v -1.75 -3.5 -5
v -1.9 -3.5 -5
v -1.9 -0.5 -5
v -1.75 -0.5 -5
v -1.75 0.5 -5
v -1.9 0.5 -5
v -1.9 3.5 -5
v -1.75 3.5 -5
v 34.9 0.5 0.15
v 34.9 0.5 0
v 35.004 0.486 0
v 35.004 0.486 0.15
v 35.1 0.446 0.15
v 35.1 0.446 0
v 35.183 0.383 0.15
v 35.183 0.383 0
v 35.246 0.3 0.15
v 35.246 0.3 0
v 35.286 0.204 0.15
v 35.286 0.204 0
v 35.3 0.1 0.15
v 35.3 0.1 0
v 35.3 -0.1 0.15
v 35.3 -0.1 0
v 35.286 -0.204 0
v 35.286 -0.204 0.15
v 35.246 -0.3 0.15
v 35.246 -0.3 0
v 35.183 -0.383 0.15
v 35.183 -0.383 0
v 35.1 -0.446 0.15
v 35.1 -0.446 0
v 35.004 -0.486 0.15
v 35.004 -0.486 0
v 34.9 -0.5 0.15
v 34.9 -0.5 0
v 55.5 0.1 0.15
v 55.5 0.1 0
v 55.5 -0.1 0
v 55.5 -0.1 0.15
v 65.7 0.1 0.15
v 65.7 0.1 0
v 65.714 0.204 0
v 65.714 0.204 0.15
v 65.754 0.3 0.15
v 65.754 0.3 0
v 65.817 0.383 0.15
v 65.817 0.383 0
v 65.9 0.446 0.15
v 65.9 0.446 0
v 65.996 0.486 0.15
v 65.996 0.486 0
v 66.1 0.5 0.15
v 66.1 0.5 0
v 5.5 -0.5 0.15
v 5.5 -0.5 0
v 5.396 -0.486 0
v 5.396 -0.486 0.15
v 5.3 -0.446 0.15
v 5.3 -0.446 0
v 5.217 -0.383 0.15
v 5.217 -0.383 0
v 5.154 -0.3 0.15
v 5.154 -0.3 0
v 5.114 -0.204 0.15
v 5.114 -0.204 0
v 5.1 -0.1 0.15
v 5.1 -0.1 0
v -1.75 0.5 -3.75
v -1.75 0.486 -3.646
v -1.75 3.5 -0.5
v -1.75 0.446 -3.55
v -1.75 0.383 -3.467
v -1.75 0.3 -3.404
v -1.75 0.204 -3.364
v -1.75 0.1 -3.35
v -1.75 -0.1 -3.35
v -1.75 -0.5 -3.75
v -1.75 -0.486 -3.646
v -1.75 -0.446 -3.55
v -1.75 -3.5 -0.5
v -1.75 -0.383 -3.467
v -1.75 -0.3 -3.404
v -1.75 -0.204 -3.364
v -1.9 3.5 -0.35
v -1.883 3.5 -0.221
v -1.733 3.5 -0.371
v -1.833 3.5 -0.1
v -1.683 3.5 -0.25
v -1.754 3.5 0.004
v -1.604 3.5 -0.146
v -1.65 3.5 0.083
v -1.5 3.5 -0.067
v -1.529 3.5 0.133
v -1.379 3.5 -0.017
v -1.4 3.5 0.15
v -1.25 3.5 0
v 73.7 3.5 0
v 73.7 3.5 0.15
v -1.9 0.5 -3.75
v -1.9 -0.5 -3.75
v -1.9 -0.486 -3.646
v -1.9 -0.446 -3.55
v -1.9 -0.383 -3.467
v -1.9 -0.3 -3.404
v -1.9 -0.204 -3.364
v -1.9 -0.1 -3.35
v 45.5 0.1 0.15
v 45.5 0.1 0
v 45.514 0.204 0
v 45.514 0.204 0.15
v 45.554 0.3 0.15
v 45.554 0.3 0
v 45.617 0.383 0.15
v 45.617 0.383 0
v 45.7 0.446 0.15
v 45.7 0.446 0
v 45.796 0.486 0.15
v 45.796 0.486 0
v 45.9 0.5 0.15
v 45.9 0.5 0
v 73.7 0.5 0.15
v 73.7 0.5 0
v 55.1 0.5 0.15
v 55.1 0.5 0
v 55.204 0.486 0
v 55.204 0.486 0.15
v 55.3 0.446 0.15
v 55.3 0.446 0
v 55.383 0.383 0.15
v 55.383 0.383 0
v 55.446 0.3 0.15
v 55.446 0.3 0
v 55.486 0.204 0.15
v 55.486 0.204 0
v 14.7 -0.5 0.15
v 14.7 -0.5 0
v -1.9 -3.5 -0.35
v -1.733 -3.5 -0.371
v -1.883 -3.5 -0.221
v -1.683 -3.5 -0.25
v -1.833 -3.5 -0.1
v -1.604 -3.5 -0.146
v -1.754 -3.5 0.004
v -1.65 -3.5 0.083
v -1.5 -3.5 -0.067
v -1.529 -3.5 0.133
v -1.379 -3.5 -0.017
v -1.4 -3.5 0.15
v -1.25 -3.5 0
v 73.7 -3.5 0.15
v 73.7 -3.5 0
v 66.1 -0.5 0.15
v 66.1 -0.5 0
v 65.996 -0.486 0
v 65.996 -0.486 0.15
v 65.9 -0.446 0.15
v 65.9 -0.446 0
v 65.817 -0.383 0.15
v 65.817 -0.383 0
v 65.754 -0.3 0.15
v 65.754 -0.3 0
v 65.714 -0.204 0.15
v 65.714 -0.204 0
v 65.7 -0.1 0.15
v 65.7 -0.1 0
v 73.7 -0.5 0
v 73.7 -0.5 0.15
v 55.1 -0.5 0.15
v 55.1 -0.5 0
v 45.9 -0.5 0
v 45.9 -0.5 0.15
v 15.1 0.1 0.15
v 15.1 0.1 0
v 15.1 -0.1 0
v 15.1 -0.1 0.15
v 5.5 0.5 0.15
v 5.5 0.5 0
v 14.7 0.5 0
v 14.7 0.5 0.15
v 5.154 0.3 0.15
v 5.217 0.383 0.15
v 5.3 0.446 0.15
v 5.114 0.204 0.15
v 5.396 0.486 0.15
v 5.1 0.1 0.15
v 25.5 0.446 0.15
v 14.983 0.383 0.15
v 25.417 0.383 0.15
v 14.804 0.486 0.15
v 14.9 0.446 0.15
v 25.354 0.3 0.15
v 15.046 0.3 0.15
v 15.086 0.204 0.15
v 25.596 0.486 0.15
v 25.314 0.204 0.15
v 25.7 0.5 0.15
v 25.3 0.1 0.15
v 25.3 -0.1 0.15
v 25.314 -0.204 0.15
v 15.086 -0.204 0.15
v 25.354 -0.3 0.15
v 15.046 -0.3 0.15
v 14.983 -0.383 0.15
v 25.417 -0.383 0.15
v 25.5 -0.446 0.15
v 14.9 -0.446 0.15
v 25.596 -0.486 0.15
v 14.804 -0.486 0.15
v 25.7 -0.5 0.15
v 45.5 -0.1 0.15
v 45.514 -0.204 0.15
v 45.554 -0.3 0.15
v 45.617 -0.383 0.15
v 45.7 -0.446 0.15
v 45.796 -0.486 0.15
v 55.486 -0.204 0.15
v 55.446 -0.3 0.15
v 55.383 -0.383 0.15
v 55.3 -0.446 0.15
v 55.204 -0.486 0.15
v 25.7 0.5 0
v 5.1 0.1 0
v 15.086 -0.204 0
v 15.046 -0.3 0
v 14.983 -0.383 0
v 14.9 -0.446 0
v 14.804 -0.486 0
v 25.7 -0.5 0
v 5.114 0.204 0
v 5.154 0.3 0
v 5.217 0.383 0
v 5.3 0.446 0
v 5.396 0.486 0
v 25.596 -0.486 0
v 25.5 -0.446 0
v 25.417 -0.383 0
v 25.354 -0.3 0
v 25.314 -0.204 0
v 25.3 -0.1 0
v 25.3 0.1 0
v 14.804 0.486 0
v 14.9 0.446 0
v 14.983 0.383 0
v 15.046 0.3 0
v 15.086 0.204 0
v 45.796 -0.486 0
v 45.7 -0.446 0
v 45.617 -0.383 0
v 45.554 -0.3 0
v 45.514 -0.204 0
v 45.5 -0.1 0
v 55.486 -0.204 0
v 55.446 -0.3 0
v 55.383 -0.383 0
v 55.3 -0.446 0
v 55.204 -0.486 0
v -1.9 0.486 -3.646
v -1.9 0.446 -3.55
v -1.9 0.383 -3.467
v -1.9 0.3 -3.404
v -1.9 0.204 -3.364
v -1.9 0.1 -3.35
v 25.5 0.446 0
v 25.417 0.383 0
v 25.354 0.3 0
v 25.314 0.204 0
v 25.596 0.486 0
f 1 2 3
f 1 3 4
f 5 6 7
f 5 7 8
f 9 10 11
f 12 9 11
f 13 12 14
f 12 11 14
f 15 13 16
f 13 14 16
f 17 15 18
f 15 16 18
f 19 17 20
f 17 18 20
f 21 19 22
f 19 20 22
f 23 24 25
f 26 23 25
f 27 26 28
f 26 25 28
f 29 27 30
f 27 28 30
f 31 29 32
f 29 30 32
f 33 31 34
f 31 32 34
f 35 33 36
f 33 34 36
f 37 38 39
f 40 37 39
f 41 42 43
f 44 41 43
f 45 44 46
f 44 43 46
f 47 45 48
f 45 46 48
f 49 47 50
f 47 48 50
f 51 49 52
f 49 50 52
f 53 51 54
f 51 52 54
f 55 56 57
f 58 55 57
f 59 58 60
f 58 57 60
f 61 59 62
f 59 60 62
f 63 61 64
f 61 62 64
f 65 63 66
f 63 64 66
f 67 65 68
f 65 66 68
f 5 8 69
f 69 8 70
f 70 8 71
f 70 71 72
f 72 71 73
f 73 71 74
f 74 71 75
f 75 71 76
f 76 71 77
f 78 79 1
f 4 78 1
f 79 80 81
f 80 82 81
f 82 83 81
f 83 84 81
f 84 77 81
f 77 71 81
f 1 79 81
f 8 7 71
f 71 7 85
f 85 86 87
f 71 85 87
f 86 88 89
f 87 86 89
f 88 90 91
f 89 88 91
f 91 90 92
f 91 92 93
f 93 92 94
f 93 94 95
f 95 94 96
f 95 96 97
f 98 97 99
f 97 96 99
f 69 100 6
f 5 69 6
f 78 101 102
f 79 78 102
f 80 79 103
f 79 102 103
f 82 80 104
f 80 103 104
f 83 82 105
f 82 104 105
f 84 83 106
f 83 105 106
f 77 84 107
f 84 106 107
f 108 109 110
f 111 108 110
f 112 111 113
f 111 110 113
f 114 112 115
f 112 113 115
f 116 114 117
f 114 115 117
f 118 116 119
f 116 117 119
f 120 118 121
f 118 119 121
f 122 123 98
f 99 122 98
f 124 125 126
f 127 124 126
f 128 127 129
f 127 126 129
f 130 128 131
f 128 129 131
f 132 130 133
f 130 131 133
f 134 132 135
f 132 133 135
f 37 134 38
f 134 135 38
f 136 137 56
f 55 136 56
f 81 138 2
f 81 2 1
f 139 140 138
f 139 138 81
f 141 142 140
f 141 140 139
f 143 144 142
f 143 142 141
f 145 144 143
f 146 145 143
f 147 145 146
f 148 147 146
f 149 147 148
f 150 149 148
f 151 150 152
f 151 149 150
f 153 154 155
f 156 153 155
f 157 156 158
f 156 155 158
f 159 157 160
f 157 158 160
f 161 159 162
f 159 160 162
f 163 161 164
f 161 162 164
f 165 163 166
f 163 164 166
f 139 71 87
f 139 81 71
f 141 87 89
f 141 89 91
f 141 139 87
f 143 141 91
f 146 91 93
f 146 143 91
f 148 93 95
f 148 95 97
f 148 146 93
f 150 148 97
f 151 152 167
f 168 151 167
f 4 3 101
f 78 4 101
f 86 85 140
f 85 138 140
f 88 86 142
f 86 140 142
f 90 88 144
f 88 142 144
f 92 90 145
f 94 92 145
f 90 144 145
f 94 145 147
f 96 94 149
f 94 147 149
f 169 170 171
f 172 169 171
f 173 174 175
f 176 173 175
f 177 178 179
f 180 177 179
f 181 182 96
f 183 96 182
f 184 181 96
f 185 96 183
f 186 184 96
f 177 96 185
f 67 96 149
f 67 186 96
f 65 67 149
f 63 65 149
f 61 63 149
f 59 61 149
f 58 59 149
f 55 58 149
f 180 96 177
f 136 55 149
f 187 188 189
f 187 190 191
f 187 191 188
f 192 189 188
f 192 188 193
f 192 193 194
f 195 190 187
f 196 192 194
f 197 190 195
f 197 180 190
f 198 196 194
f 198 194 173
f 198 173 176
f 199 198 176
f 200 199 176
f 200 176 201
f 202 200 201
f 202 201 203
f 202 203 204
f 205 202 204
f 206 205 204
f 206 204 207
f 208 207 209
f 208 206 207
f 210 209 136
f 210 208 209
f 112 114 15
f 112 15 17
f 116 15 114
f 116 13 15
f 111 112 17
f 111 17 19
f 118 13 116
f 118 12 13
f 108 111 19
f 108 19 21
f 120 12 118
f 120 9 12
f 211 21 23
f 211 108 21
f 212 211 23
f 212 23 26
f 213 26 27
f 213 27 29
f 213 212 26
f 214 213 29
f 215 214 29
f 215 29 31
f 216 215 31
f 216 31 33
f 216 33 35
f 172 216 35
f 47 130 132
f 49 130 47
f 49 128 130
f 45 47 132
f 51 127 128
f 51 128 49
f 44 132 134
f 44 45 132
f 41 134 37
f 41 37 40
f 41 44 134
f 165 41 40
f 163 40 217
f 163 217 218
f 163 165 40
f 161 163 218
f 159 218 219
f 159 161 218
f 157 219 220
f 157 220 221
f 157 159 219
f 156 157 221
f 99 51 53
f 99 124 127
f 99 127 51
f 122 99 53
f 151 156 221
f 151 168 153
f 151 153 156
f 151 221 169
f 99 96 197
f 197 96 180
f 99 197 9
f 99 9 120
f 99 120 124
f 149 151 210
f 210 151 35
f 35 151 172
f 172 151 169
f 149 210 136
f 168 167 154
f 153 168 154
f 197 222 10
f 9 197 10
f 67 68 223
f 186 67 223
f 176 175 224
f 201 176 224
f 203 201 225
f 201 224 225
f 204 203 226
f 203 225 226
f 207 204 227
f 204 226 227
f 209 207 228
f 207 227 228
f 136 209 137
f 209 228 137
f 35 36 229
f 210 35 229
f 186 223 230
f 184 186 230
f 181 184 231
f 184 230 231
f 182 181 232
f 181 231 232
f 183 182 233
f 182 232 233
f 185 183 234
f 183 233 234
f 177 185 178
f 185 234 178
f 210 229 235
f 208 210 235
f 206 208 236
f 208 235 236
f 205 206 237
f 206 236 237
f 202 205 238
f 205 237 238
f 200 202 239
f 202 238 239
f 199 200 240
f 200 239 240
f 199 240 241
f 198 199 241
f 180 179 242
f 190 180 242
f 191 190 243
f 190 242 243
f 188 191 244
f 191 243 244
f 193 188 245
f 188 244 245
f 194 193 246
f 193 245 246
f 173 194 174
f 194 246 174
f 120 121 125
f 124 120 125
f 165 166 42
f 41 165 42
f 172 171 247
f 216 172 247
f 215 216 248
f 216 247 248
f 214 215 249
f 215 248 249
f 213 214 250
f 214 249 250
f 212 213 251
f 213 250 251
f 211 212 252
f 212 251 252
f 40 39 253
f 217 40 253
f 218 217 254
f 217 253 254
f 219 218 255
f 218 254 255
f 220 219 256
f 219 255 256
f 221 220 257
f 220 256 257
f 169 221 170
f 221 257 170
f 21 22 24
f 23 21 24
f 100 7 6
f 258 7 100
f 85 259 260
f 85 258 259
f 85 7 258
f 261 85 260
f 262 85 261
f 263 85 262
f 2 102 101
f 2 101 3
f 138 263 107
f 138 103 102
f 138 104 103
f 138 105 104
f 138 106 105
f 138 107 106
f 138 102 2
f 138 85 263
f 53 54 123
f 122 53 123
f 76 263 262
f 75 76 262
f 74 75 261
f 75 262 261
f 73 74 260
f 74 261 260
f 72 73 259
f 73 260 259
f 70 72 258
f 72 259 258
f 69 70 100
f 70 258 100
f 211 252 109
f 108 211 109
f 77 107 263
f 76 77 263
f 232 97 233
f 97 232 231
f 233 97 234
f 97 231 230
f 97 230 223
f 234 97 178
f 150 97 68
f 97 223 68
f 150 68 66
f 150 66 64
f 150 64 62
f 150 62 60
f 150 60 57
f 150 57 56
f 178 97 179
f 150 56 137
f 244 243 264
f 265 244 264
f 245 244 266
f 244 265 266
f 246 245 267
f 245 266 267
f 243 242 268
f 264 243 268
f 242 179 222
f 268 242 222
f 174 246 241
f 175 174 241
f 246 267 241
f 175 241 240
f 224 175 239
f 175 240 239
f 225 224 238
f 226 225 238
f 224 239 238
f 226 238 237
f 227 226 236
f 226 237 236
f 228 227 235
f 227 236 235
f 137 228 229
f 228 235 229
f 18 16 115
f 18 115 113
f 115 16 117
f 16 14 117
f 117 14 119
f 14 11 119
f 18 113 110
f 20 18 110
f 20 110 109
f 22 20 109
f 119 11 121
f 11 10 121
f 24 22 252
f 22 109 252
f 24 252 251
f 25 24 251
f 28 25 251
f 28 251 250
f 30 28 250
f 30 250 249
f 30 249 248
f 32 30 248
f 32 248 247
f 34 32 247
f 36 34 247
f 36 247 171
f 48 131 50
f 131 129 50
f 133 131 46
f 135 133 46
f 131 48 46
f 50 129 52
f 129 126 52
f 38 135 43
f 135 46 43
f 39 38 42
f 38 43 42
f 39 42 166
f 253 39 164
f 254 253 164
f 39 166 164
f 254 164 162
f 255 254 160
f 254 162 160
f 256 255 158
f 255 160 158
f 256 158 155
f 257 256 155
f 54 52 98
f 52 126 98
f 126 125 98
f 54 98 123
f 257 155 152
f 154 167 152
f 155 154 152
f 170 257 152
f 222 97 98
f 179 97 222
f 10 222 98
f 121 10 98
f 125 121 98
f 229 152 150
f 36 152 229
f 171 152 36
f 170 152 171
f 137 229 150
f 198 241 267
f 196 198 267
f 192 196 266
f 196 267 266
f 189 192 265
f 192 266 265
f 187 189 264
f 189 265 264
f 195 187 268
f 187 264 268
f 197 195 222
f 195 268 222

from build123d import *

# Parameters (mm, degrees)
F0_W     = 3
F0_H     = 3
F1_DEPTH = 0.15
F2_DEPTH = 1.9
F3_W     = 0.15
F3_H     = 7
F4_DEPTH = 5
F6_DEPTH = 25
F7_R     = 0.5


with BuildPart() as f1:
    # F0 (on Top) → F1 (new body)
    with BuildSketch(Plane.XY):
        with Locations((72.2, 2)):
            Rectangle(F0_W, F0_H)
        with BuildLine():
            Line((10.1, -0.5), (10.1, -3.5))
            Line((10.1, -3.5), (20.2, -3.5))
            Line((20.2, -3.5), (30.3, -3.5))
            Line((30.3, -3.5), (30.3, -0.5))
            Line((30.3, -0.5), (25.7, -0.5))
            ThreePointArc((25.7, -0.5), (25.4171572875, -0.3828427125), (25.3, -0.1))
            Line((25.3, -0.1), (25.3, 0.1))
            ThreePointArc((25.3, 0.1), (25.4171572875, 0.3828427125), (25.7, 0.5))
            Line((25.7, 0.5), (30.3, 0.5))
            Line((30.3, 0.5), (30.3, 3.5))
            Line((30.3, 3.5), (20.2, 3.5))
            Line((20.2, 3.5), (10.1, 3.5))
            Line((10.1, 3.5), (10.1, 0.5))
            Line((10.1, 0.5), (14.7, 0.5))
            ThreePointArc((14.7, 0.5), (14.9828427125, 0.3828427125), (15.1, 0.1))
            Line((15.1, 0.1), (15.1, -0.1))
            ThreePointArc((15.1, -0.1), (14.9828427125, -0.3828427125), (14.7, -0.5))
            Line((14.7, -0.5), (10.1, -0.5))
        make_face()
        with BuildLine():
            Line((30.3, -0.5), (30.3, -3.5))
            Line((30.3, -3.5), (40.4, -3.5))
            Line((40.4, -3.5), (50.5, -3.5))
            Line((50.5, -3.5), (50.5, -0.5))
            Line((50.5, -0.5), (45.9, -0.5))
            ThreePointArc((45.9, -0.5), (45.6171572875, -0.3828427125), (45.5, -0.1))
            Line((45.5, -0.1), (45.5, 0.1))
            ThreePointArc((45.5, 0.1), (45.6171572875, 0.3828427125), (45.9, 0.5))
            Line((45.9, 0.5), (50.5, 0.5))
            Line((50.5, 0.5), (50.5, 3.5))
            Line((50.5, 3.5), (40.4, 3.5))
            Line((40.4, 3.5), (30.3, 3.5))
            Line((30.3, 3.5), (30.3, 0.5))
            Line((30.3, 0.5), (34.9, 0.5))
            ThreePointArc((34.9, 0.5), (35.1828427125, 0.3828427125), (35.3, 0.1))
            Line((35.3, 0.1), (35.3, -0.1))
            ThreePointArc((35.3, -0.1), (35.1828427125, -0.3828427125), (34.9, -0.5))
            Line((34.9, -0.5), (30.3, -0.5))
        make_face()
        with BuildLine():
            Line((50.5, -0.5), (50.5, -3.5))
            Line((50.5, -3.5), (60.6, -3.5))
            Line((60.6, -3.5), (70.7, -3.5))
            Line((70.7, -3.5), (70.7, -0.5))
            Line((70.7, -0.5), (66.1, -0.5))
            ThreePointArc((66.1, -0.5), (65.8171572875, -0.3828427125), (65.7, -0.1))
            Line((65.7, -0.1), (65.7, 0.1))
            ThreePointArc((65.7, 0.1), (65.8171572875, 0.3828427125), (66.1, 0.5))
            Line((66.1, 0.5), (70.7, 0.5))
            Line((70.7, 0.5), (70.7, 3.5))
            Line((70.7, 3.5), (60.6, 3.5))
            Line((60.6, 3.5), (50.5, 3.5))
            Line((50.5, 3.5), (50.5, 0.5))
            Line((50.5, 0.5), (55.1, 0.5))
            ThreePointArc((55.1, 0.5), (55.3828427125, 0.3828427125), (55.5, 0.1))
            Line((55.5, 0.1), (55.5, -0.1))
            ThreePointArc((55.5, -0.1), (55.3828427125, -0.3828427125), (55.1, -0.5))
            Line((55.1, -0.5), (50.5, -0.5))
        make_face()
        with BuildLine():
            Line((0, 3.5), (0, -3.5))
            Line((0, -3.5), (10.1, -3.5))
            Line((10.1, -3.5), (10.1, -0.5))
            Line((10.1, -0.5), (5.5, -0.5))
            ThreePointArc((5.5, -0.5), (5.2171572875, -0.3828427125), (5.1, -0.1))
            Line((5.1, -0.1), (5.1, 0.1))
            ThreePointArc((5.1, 0.1), (5.2171572875, 0.3828427125), (5.5, 0.5))
            Line((5.5, 0.5), (10.1, 0.5))
            Line((10.1, 0.5), (10.1, 3.5))
            Line((10.1, 3.5), (0, 3.5))
        make_face()
        with Locations((72.2, -2)):
            Rectangle(F0_W, F0_H)
    extrude(amount=F1_DEPTH)

    # F2 (add): a face of the model
    f2_faces = [f1.faces().sort_by_distance(p)[0] for p in [
        (0, 0, 0.075),
    ]]
    extrude(f2_faces, amount=F2_DEPTH)

    # F3 (on face) → F4 (join)
    with BuildSketch(Plane(origin=(0, 0, 0), x_dir=(1, 0, 0), z_dir=(0, 0, -1))):
        with Locations((-1.825, 0)):
            Rectangle(F3_W, F3_H)
    extrude(amount=F4_DEPTH)

    # F5 (on face) → F6 (cut)
    with BuildSketch(Plane(origin=(-1.9, 0, 0), x_dir=(0, -1, 0), z_dir=(-1, 0, 0))):
        with BuildLine():
            ThreePointArc((0.5, -3.75), (0.3828427125, -3.4671572875), (0.1, -3.35))
            Line((0.1, -3.35), (-0.1, -3.35))
            ThreePointArc((-0.1, -3.35), (-0.3828427125, -3.4671572875), (-0.5, -3.75))
            Line((-0.5, -3.75), (-0.5, -5))
            Line((-0.5, -5), (0.5, -5))
            Line((0.5, -5), (0.5, -3.75))
        make_face()
    extrude(amount=-F6_DEPTH, mode=Mode.SUBTRACT)

    # F7
    f7_edges = [f1.edges().sort_by_distance(p)[0] for p in [
        (-1.9, 0, 0.15),
        (-1.75, 0, 0),
    ]]
    fillet(f7_edges, radius=F7_R)


solid = f1.part
